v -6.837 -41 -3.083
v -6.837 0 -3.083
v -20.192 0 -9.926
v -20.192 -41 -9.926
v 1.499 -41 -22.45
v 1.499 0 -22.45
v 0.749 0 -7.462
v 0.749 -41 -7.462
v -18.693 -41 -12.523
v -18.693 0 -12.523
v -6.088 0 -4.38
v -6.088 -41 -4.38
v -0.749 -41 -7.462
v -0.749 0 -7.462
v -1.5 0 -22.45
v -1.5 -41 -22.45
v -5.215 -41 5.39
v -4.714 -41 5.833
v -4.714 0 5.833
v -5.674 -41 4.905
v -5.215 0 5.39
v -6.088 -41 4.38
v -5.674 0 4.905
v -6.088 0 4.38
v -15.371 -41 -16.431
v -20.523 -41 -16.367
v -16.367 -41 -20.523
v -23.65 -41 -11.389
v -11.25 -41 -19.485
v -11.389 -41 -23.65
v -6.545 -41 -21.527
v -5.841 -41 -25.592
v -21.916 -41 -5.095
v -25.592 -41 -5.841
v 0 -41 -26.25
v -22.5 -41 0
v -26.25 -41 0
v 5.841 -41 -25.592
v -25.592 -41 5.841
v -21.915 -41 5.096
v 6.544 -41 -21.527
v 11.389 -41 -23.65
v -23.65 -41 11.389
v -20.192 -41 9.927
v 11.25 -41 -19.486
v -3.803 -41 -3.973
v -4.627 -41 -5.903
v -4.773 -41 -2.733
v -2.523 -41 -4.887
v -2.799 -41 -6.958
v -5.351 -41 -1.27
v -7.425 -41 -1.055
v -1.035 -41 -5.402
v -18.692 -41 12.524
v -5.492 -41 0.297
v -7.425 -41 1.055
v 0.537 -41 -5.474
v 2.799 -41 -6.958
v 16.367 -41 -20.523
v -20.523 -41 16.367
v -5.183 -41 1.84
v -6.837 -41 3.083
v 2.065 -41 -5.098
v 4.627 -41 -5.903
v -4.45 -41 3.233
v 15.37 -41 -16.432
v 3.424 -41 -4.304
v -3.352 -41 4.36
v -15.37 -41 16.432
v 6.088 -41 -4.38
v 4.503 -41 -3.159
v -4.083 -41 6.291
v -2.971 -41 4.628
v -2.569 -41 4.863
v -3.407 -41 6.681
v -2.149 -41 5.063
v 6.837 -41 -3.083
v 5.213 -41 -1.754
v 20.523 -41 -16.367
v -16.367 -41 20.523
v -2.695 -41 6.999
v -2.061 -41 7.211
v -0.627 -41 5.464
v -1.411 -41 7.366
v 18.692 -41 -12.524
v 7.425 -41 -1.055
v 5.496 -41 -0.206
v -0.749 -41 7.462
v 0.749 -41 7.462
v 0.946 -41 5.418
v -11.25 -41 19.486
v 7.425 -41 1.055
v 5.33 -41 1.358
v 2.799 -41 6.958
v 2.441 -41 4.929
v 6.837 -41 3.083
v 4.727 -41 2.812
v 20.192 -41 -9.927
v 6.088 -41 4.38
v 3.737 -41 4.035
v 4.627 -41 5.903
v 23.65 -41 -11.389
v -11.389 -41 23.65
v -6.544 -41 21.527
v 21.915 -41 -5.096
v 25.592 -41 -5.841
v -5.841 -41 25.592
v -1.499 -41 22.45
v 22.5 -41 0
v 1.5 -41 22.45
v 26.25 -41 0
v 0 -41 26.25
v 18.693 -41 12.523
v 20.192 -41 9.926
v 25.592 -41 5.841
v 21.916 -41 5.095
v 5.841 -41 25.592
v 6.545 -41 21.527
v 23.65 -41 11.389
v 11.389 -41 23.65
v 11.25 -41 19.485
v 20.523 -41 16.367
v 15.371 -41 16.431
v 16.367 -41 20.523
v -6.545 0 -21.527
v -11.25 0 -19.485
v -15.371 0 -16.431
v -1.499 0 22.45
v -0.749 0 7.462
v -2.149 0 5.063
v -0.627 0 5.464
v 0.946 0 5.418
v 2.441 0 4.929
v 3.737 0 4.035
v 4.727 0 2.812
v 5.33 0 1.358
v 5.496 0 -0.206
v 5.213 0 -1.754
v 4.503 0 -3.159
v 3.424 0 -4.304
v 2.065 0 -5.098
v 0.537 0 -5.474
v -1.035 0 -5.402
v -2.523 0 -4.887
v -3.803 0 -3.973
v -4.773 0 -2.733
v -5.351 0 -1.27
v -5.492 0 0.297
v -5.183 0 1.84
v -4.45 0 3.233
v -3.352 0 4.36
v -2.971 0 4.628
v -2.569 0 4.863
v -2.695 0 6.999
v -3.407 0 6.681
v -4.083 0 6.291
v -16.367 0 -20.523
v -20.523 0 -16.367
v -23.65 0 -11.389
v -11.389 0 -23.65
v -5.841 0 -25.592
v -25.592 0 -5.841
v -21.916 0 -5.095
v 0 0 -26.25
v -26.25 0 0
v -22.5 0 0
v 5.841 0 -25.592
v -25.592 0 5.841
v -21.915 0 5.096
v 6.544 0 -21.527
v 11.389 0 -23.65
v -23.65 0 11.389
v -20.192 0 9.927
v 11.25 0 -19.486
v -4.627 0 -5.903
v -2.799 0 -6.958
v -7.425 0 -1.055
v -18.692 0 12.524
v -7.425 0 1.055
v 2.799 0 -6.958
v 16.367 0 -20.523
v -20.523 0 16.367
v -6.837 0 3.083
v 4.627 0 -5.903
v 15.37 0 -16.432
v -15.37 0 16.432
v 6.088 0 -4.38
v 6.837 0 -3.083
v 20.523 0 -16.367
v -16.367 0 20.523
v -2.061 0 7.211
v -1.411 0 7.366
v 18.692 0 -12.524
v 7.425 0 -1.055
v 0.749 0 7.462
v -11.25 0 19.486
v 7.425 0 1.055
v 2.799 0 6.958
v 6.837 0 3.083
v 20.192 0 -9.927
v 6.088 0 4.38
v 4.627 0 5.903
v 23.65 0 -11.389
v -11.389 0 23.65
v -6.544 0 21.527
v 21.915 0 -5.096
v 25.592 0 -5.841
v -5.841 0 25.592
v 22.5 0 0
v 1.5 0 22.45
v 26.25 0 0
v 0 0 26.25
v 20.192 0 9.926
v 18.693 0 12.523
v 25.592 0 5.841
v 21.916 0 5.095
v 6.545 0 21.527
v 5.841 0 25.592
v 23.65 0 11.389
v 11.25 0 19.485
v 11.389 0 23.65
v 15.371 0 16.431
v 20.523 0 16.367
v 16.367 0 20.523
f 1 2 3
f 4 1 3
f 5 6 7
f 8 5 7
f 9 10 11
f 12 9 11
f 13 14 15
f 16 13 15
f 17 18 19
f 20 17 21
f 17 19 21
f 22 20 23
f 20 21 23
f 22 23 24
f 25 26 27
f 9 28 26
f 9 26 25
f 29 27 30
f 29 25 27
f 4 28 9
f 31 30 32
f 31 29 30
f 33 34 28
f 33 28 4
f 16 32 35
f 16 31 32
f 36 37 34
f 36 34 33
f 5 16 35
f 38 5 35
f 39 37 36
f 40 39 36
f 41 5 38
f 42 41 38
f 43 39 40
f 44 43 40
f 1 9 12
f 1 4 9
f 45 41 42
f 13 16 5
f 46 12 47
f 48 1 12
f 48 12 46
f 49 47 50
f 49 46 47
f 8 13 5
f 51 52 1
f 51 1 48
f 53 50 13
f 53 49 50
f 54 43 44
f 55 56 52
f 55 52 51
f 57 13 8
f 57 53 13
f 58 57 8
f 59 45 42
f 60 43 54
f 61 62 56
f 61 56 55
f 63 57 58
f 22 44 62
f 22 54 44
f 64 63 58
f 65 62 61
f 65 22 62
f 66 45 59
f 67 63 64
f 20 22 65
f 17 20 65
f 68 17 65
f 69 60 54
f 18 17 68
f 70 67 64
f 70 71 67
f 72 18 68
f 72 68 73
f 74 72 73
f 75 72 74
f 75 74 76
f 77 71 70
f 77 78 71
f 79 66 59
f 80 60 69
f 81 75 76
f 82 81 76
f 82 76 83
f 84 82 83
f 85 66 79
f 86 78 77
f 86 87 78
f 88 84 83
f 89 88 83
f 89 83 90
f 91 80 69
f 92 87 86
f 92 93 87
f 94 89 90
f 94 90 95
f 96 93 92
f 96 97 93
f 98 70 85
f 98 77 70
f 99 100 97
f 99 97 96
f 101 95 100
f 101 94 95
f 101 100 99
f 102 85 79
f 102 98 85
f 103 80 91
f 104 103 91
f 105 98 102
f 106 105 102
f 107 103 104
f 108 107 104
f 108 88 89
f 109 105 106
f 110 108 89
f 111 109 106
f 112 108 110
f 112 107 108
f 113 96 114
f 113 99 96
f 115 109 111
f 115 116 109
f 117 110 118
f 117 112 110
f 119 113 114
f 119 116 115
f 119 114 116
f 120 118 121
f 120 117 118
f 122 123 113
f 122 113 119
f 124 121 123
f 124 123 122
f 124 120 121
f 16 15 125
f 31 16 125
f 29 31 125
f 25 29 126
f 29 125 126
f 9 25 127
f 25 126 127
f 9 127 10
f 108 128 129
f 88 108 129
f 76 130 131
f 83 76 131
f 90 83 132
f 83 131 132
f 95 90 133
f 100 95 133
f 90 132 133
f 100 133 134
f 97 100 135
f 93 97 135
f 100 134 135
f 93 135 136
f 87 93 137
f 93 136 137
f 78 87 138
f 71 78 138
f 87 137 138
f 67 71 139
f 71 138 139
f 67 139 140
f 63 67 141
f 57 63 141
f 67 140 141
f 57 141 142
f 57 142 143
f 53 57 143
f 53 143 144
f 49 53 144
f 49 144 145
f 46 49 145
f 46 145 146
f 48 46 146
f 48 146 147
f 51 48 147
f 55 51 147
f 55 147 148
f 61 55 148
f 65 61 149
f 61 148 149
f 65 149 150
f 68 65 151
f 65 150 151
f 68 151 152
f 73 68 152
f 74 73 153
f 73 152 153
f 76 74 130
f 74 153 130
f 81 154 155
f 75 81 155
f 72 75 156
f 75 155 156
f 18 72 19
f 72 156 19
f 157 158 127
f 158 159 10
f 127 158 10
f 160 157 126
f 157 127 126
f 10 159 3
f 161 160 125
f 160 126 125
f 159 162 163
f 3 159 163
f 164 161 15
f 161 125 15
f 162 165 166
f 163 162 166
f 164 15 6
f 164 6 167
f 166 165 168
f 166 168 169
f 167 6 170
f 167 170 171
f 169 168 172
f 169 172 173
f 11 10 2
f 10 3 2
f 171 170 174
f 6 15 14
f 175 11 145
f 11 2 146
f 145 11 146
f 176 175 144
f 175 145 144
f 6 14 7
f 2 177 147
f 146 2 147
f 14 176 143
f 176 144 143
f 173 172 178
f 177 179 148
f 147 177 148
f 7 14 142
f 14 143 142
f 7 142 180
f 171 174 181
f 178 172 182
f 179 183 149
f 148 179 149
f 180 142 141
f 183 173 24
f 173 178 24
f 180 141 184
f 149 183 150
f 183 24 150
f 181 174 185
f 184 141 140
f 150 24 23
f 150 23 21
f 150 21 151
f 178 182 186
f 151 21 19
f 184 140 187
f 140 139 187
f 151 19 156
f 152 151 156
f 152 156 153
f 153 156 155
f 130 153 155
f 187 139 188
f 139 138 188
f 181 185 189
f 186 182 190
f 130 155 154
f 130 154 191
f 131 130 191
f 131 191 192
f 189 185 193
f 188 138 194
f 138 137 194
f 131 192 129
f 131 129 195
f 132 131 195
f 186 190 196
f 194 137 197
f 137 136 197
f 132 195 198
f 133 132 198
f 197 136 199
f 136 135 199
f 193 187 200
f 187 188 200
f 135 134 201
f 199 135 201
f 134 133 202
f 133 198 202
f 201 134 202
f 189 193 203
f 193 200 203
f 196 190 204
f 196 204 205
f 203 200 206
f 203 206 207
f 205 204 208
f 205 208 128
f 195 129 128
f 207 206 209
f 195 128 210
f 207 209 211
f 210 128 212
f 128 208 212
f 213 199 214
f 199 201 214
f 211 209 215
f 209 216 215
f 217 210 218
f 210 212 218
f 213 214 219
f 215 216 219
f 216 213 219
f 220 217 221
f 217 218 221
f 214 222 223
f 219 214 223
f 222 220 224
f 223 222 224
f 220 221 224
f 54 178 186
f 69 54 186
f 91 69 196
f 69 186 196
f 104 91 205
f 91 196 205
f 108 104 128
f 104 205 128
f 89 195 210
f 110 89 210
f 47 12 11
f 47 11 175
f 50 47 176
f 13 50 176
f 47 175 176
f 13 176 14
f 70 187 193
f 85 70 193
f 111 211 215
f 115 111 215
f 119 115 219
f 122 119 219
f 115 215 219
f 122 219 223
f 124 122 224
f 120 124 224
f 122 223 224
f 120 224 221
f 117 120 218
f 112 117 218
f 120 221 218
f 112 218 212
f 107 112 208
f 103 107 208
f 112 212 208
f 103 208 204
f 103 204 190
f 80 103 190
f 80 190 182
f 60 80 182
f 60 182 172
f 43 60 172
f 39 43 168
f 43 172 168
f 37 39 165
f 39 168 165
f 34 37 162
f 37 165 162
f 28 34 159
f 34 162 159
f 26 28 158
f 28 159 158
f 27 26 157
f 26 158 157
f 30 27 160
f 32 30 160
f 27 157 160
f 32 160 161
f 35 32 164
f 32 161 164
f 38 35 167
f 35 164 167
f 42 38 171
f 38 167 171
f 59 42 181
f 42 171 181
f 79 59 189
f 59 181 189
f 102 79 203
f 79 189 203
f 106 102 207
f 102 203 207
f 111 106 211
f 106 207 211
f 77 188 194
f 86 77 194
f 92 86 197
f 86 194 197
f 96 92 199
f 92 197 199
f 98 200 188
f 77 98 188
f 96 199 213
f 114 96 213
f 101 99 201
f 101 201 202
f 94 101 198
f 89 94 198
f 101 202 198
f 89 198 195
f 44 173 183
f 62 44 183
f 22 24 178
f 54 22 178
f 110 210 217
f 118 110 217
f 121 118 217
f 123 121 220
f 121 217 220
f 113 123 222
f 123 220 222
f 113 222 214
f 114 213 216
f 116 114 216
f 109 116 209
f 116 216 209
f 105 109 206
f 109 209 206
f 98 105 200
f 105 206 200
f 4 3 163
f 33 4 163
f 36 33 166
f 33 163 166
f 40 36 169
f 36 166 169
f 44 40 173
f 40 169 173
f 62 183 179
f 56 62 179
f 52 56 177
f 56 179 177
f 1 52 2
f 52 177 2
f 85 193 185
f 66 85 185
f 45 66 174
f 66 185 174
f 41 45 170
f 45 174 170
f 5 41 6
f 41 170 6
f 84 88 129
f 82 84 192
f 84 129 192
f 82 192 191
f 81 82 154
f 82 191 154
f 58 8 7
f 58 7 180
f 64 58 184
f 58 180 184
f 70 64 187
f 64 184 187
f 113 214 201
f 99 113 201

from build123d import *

# Parameters (mm, degrees)
F0_R     = 26.25
F1_DEPTH = 41


with BuildPart() as f1:
    # F0 (on Front) → F1 (new body)
    with BuildSketch(Plane.XZ):
        Circle(F0_R)
        with BuildLine():
            ThreePointArc((-1.5, -22.449944), (-11.250362, -19.485363), (-18.692687, -12.523316))
            Line((-18.692687, -12.523316), (-6.088184, -4.379957))
            ThreePointArc((-6.088184, -4.379957), (-3.75, -6.495191), (-0.749062, -7.4625))
            Line((-0.749062, -7.4625), (-1.5, -22.449944))
        make_face(mode=Mode.SUBTRACT)
        with BuildLine():
            ThreePointArc((18.692222, -12.52401), (11.249638, -19.48578), (1.499166, -22.45))
            Line((1.499166, -22.45), (0.749062, -7.4625))
            ThreePointArc((0.749062, -7.4625), (3.75, -6.495191), (6.088184, -4.379957))
            Line((6.088184, -4.379957), (18.692222, -12.52401))
        make_face(mode=Mode.SUBTRACT)
        with BuildLine():
            ThreePointArc((20.192222, 9.925934), (22.5, -0.000418), (20.191854, -9.926684))
            Line((20.191854, -9.926684), (6.837246, -3.082543))
            ThreePointArc((6.837246, -3.082543), (7.5, 0), (6.837246, 3.082543))
            Line((6.837246, 3.082543), (20.192222, 9.925934))
        make_face(mode=Mode.SUBTRACT)
        with BuildLine():
            ThreePointArc((-20.192222, -9.925934), (-22.5, 0.000418), (-20.191854, 9.926684))
            Line((-20.191854, 9.926684), (-6.837246, 3.082543))
            ThreePointArc((-6.837246, 3.082543), (-7.5, 0), (-6.837246, -3.082543))
            Line((-6.837246, -3.082543), (-20.192222, -9.925934))
        make_face(mode=Mode.SUBTRACT)
        with BuildLine():
            ThreePointArc((-18.692222, 12.52401), (-11.249638, 19.48578), (-1.499166, 22.45))
            Line((-1.499166, 22.45), (-0.749062, 7.4625))
            ThreePointArc((-0.749062, 7.4625), (-1.737374, 7.295994), (-2.69466, 6.9992))
            ThreePointArc((-2.69466, 6.9992), (-3.75, 6.495191), (-4.714155, 5.833245))
            ThreePointArc((-4.714155, 5.833245), (-5.44983, 5.152607), (-6.088184, 4.379957))
            Line((-6.088184, 4.379957), (-18.692222, 12.52401))
        make_face(mode=Mode.SUBTRACT)
        with BuildLine():
            ThreePointArc((-2.148919, 5.06282), (2.772797, -4.749905), (-3.352022, 4.360498))
            ThreePointArc((-3.352022, 4.360498), (-2.772797, 4.749905), (-2.148919, 5.06282))
        make_face(mode=Mode.SUBTRACT)
        with BuildLine():
            Line((0.749062, 7.4625), (1.5, 22.449944))
            ThreePointArc((1.5, 22.449944), (11.250362, 19.485363), (18.692687, 12.523316))
            Line((18.692687, 12.523316), (6.088184, 4.379957))
            ThreePointArc((6.088184, 4.379957), (3.75, 6.495191), (0.749062, 7.4625))
        make_face(mode=Mode.SUBTRACT)
    extrude(amount=F1_DEPTH)


solid = f1.part
